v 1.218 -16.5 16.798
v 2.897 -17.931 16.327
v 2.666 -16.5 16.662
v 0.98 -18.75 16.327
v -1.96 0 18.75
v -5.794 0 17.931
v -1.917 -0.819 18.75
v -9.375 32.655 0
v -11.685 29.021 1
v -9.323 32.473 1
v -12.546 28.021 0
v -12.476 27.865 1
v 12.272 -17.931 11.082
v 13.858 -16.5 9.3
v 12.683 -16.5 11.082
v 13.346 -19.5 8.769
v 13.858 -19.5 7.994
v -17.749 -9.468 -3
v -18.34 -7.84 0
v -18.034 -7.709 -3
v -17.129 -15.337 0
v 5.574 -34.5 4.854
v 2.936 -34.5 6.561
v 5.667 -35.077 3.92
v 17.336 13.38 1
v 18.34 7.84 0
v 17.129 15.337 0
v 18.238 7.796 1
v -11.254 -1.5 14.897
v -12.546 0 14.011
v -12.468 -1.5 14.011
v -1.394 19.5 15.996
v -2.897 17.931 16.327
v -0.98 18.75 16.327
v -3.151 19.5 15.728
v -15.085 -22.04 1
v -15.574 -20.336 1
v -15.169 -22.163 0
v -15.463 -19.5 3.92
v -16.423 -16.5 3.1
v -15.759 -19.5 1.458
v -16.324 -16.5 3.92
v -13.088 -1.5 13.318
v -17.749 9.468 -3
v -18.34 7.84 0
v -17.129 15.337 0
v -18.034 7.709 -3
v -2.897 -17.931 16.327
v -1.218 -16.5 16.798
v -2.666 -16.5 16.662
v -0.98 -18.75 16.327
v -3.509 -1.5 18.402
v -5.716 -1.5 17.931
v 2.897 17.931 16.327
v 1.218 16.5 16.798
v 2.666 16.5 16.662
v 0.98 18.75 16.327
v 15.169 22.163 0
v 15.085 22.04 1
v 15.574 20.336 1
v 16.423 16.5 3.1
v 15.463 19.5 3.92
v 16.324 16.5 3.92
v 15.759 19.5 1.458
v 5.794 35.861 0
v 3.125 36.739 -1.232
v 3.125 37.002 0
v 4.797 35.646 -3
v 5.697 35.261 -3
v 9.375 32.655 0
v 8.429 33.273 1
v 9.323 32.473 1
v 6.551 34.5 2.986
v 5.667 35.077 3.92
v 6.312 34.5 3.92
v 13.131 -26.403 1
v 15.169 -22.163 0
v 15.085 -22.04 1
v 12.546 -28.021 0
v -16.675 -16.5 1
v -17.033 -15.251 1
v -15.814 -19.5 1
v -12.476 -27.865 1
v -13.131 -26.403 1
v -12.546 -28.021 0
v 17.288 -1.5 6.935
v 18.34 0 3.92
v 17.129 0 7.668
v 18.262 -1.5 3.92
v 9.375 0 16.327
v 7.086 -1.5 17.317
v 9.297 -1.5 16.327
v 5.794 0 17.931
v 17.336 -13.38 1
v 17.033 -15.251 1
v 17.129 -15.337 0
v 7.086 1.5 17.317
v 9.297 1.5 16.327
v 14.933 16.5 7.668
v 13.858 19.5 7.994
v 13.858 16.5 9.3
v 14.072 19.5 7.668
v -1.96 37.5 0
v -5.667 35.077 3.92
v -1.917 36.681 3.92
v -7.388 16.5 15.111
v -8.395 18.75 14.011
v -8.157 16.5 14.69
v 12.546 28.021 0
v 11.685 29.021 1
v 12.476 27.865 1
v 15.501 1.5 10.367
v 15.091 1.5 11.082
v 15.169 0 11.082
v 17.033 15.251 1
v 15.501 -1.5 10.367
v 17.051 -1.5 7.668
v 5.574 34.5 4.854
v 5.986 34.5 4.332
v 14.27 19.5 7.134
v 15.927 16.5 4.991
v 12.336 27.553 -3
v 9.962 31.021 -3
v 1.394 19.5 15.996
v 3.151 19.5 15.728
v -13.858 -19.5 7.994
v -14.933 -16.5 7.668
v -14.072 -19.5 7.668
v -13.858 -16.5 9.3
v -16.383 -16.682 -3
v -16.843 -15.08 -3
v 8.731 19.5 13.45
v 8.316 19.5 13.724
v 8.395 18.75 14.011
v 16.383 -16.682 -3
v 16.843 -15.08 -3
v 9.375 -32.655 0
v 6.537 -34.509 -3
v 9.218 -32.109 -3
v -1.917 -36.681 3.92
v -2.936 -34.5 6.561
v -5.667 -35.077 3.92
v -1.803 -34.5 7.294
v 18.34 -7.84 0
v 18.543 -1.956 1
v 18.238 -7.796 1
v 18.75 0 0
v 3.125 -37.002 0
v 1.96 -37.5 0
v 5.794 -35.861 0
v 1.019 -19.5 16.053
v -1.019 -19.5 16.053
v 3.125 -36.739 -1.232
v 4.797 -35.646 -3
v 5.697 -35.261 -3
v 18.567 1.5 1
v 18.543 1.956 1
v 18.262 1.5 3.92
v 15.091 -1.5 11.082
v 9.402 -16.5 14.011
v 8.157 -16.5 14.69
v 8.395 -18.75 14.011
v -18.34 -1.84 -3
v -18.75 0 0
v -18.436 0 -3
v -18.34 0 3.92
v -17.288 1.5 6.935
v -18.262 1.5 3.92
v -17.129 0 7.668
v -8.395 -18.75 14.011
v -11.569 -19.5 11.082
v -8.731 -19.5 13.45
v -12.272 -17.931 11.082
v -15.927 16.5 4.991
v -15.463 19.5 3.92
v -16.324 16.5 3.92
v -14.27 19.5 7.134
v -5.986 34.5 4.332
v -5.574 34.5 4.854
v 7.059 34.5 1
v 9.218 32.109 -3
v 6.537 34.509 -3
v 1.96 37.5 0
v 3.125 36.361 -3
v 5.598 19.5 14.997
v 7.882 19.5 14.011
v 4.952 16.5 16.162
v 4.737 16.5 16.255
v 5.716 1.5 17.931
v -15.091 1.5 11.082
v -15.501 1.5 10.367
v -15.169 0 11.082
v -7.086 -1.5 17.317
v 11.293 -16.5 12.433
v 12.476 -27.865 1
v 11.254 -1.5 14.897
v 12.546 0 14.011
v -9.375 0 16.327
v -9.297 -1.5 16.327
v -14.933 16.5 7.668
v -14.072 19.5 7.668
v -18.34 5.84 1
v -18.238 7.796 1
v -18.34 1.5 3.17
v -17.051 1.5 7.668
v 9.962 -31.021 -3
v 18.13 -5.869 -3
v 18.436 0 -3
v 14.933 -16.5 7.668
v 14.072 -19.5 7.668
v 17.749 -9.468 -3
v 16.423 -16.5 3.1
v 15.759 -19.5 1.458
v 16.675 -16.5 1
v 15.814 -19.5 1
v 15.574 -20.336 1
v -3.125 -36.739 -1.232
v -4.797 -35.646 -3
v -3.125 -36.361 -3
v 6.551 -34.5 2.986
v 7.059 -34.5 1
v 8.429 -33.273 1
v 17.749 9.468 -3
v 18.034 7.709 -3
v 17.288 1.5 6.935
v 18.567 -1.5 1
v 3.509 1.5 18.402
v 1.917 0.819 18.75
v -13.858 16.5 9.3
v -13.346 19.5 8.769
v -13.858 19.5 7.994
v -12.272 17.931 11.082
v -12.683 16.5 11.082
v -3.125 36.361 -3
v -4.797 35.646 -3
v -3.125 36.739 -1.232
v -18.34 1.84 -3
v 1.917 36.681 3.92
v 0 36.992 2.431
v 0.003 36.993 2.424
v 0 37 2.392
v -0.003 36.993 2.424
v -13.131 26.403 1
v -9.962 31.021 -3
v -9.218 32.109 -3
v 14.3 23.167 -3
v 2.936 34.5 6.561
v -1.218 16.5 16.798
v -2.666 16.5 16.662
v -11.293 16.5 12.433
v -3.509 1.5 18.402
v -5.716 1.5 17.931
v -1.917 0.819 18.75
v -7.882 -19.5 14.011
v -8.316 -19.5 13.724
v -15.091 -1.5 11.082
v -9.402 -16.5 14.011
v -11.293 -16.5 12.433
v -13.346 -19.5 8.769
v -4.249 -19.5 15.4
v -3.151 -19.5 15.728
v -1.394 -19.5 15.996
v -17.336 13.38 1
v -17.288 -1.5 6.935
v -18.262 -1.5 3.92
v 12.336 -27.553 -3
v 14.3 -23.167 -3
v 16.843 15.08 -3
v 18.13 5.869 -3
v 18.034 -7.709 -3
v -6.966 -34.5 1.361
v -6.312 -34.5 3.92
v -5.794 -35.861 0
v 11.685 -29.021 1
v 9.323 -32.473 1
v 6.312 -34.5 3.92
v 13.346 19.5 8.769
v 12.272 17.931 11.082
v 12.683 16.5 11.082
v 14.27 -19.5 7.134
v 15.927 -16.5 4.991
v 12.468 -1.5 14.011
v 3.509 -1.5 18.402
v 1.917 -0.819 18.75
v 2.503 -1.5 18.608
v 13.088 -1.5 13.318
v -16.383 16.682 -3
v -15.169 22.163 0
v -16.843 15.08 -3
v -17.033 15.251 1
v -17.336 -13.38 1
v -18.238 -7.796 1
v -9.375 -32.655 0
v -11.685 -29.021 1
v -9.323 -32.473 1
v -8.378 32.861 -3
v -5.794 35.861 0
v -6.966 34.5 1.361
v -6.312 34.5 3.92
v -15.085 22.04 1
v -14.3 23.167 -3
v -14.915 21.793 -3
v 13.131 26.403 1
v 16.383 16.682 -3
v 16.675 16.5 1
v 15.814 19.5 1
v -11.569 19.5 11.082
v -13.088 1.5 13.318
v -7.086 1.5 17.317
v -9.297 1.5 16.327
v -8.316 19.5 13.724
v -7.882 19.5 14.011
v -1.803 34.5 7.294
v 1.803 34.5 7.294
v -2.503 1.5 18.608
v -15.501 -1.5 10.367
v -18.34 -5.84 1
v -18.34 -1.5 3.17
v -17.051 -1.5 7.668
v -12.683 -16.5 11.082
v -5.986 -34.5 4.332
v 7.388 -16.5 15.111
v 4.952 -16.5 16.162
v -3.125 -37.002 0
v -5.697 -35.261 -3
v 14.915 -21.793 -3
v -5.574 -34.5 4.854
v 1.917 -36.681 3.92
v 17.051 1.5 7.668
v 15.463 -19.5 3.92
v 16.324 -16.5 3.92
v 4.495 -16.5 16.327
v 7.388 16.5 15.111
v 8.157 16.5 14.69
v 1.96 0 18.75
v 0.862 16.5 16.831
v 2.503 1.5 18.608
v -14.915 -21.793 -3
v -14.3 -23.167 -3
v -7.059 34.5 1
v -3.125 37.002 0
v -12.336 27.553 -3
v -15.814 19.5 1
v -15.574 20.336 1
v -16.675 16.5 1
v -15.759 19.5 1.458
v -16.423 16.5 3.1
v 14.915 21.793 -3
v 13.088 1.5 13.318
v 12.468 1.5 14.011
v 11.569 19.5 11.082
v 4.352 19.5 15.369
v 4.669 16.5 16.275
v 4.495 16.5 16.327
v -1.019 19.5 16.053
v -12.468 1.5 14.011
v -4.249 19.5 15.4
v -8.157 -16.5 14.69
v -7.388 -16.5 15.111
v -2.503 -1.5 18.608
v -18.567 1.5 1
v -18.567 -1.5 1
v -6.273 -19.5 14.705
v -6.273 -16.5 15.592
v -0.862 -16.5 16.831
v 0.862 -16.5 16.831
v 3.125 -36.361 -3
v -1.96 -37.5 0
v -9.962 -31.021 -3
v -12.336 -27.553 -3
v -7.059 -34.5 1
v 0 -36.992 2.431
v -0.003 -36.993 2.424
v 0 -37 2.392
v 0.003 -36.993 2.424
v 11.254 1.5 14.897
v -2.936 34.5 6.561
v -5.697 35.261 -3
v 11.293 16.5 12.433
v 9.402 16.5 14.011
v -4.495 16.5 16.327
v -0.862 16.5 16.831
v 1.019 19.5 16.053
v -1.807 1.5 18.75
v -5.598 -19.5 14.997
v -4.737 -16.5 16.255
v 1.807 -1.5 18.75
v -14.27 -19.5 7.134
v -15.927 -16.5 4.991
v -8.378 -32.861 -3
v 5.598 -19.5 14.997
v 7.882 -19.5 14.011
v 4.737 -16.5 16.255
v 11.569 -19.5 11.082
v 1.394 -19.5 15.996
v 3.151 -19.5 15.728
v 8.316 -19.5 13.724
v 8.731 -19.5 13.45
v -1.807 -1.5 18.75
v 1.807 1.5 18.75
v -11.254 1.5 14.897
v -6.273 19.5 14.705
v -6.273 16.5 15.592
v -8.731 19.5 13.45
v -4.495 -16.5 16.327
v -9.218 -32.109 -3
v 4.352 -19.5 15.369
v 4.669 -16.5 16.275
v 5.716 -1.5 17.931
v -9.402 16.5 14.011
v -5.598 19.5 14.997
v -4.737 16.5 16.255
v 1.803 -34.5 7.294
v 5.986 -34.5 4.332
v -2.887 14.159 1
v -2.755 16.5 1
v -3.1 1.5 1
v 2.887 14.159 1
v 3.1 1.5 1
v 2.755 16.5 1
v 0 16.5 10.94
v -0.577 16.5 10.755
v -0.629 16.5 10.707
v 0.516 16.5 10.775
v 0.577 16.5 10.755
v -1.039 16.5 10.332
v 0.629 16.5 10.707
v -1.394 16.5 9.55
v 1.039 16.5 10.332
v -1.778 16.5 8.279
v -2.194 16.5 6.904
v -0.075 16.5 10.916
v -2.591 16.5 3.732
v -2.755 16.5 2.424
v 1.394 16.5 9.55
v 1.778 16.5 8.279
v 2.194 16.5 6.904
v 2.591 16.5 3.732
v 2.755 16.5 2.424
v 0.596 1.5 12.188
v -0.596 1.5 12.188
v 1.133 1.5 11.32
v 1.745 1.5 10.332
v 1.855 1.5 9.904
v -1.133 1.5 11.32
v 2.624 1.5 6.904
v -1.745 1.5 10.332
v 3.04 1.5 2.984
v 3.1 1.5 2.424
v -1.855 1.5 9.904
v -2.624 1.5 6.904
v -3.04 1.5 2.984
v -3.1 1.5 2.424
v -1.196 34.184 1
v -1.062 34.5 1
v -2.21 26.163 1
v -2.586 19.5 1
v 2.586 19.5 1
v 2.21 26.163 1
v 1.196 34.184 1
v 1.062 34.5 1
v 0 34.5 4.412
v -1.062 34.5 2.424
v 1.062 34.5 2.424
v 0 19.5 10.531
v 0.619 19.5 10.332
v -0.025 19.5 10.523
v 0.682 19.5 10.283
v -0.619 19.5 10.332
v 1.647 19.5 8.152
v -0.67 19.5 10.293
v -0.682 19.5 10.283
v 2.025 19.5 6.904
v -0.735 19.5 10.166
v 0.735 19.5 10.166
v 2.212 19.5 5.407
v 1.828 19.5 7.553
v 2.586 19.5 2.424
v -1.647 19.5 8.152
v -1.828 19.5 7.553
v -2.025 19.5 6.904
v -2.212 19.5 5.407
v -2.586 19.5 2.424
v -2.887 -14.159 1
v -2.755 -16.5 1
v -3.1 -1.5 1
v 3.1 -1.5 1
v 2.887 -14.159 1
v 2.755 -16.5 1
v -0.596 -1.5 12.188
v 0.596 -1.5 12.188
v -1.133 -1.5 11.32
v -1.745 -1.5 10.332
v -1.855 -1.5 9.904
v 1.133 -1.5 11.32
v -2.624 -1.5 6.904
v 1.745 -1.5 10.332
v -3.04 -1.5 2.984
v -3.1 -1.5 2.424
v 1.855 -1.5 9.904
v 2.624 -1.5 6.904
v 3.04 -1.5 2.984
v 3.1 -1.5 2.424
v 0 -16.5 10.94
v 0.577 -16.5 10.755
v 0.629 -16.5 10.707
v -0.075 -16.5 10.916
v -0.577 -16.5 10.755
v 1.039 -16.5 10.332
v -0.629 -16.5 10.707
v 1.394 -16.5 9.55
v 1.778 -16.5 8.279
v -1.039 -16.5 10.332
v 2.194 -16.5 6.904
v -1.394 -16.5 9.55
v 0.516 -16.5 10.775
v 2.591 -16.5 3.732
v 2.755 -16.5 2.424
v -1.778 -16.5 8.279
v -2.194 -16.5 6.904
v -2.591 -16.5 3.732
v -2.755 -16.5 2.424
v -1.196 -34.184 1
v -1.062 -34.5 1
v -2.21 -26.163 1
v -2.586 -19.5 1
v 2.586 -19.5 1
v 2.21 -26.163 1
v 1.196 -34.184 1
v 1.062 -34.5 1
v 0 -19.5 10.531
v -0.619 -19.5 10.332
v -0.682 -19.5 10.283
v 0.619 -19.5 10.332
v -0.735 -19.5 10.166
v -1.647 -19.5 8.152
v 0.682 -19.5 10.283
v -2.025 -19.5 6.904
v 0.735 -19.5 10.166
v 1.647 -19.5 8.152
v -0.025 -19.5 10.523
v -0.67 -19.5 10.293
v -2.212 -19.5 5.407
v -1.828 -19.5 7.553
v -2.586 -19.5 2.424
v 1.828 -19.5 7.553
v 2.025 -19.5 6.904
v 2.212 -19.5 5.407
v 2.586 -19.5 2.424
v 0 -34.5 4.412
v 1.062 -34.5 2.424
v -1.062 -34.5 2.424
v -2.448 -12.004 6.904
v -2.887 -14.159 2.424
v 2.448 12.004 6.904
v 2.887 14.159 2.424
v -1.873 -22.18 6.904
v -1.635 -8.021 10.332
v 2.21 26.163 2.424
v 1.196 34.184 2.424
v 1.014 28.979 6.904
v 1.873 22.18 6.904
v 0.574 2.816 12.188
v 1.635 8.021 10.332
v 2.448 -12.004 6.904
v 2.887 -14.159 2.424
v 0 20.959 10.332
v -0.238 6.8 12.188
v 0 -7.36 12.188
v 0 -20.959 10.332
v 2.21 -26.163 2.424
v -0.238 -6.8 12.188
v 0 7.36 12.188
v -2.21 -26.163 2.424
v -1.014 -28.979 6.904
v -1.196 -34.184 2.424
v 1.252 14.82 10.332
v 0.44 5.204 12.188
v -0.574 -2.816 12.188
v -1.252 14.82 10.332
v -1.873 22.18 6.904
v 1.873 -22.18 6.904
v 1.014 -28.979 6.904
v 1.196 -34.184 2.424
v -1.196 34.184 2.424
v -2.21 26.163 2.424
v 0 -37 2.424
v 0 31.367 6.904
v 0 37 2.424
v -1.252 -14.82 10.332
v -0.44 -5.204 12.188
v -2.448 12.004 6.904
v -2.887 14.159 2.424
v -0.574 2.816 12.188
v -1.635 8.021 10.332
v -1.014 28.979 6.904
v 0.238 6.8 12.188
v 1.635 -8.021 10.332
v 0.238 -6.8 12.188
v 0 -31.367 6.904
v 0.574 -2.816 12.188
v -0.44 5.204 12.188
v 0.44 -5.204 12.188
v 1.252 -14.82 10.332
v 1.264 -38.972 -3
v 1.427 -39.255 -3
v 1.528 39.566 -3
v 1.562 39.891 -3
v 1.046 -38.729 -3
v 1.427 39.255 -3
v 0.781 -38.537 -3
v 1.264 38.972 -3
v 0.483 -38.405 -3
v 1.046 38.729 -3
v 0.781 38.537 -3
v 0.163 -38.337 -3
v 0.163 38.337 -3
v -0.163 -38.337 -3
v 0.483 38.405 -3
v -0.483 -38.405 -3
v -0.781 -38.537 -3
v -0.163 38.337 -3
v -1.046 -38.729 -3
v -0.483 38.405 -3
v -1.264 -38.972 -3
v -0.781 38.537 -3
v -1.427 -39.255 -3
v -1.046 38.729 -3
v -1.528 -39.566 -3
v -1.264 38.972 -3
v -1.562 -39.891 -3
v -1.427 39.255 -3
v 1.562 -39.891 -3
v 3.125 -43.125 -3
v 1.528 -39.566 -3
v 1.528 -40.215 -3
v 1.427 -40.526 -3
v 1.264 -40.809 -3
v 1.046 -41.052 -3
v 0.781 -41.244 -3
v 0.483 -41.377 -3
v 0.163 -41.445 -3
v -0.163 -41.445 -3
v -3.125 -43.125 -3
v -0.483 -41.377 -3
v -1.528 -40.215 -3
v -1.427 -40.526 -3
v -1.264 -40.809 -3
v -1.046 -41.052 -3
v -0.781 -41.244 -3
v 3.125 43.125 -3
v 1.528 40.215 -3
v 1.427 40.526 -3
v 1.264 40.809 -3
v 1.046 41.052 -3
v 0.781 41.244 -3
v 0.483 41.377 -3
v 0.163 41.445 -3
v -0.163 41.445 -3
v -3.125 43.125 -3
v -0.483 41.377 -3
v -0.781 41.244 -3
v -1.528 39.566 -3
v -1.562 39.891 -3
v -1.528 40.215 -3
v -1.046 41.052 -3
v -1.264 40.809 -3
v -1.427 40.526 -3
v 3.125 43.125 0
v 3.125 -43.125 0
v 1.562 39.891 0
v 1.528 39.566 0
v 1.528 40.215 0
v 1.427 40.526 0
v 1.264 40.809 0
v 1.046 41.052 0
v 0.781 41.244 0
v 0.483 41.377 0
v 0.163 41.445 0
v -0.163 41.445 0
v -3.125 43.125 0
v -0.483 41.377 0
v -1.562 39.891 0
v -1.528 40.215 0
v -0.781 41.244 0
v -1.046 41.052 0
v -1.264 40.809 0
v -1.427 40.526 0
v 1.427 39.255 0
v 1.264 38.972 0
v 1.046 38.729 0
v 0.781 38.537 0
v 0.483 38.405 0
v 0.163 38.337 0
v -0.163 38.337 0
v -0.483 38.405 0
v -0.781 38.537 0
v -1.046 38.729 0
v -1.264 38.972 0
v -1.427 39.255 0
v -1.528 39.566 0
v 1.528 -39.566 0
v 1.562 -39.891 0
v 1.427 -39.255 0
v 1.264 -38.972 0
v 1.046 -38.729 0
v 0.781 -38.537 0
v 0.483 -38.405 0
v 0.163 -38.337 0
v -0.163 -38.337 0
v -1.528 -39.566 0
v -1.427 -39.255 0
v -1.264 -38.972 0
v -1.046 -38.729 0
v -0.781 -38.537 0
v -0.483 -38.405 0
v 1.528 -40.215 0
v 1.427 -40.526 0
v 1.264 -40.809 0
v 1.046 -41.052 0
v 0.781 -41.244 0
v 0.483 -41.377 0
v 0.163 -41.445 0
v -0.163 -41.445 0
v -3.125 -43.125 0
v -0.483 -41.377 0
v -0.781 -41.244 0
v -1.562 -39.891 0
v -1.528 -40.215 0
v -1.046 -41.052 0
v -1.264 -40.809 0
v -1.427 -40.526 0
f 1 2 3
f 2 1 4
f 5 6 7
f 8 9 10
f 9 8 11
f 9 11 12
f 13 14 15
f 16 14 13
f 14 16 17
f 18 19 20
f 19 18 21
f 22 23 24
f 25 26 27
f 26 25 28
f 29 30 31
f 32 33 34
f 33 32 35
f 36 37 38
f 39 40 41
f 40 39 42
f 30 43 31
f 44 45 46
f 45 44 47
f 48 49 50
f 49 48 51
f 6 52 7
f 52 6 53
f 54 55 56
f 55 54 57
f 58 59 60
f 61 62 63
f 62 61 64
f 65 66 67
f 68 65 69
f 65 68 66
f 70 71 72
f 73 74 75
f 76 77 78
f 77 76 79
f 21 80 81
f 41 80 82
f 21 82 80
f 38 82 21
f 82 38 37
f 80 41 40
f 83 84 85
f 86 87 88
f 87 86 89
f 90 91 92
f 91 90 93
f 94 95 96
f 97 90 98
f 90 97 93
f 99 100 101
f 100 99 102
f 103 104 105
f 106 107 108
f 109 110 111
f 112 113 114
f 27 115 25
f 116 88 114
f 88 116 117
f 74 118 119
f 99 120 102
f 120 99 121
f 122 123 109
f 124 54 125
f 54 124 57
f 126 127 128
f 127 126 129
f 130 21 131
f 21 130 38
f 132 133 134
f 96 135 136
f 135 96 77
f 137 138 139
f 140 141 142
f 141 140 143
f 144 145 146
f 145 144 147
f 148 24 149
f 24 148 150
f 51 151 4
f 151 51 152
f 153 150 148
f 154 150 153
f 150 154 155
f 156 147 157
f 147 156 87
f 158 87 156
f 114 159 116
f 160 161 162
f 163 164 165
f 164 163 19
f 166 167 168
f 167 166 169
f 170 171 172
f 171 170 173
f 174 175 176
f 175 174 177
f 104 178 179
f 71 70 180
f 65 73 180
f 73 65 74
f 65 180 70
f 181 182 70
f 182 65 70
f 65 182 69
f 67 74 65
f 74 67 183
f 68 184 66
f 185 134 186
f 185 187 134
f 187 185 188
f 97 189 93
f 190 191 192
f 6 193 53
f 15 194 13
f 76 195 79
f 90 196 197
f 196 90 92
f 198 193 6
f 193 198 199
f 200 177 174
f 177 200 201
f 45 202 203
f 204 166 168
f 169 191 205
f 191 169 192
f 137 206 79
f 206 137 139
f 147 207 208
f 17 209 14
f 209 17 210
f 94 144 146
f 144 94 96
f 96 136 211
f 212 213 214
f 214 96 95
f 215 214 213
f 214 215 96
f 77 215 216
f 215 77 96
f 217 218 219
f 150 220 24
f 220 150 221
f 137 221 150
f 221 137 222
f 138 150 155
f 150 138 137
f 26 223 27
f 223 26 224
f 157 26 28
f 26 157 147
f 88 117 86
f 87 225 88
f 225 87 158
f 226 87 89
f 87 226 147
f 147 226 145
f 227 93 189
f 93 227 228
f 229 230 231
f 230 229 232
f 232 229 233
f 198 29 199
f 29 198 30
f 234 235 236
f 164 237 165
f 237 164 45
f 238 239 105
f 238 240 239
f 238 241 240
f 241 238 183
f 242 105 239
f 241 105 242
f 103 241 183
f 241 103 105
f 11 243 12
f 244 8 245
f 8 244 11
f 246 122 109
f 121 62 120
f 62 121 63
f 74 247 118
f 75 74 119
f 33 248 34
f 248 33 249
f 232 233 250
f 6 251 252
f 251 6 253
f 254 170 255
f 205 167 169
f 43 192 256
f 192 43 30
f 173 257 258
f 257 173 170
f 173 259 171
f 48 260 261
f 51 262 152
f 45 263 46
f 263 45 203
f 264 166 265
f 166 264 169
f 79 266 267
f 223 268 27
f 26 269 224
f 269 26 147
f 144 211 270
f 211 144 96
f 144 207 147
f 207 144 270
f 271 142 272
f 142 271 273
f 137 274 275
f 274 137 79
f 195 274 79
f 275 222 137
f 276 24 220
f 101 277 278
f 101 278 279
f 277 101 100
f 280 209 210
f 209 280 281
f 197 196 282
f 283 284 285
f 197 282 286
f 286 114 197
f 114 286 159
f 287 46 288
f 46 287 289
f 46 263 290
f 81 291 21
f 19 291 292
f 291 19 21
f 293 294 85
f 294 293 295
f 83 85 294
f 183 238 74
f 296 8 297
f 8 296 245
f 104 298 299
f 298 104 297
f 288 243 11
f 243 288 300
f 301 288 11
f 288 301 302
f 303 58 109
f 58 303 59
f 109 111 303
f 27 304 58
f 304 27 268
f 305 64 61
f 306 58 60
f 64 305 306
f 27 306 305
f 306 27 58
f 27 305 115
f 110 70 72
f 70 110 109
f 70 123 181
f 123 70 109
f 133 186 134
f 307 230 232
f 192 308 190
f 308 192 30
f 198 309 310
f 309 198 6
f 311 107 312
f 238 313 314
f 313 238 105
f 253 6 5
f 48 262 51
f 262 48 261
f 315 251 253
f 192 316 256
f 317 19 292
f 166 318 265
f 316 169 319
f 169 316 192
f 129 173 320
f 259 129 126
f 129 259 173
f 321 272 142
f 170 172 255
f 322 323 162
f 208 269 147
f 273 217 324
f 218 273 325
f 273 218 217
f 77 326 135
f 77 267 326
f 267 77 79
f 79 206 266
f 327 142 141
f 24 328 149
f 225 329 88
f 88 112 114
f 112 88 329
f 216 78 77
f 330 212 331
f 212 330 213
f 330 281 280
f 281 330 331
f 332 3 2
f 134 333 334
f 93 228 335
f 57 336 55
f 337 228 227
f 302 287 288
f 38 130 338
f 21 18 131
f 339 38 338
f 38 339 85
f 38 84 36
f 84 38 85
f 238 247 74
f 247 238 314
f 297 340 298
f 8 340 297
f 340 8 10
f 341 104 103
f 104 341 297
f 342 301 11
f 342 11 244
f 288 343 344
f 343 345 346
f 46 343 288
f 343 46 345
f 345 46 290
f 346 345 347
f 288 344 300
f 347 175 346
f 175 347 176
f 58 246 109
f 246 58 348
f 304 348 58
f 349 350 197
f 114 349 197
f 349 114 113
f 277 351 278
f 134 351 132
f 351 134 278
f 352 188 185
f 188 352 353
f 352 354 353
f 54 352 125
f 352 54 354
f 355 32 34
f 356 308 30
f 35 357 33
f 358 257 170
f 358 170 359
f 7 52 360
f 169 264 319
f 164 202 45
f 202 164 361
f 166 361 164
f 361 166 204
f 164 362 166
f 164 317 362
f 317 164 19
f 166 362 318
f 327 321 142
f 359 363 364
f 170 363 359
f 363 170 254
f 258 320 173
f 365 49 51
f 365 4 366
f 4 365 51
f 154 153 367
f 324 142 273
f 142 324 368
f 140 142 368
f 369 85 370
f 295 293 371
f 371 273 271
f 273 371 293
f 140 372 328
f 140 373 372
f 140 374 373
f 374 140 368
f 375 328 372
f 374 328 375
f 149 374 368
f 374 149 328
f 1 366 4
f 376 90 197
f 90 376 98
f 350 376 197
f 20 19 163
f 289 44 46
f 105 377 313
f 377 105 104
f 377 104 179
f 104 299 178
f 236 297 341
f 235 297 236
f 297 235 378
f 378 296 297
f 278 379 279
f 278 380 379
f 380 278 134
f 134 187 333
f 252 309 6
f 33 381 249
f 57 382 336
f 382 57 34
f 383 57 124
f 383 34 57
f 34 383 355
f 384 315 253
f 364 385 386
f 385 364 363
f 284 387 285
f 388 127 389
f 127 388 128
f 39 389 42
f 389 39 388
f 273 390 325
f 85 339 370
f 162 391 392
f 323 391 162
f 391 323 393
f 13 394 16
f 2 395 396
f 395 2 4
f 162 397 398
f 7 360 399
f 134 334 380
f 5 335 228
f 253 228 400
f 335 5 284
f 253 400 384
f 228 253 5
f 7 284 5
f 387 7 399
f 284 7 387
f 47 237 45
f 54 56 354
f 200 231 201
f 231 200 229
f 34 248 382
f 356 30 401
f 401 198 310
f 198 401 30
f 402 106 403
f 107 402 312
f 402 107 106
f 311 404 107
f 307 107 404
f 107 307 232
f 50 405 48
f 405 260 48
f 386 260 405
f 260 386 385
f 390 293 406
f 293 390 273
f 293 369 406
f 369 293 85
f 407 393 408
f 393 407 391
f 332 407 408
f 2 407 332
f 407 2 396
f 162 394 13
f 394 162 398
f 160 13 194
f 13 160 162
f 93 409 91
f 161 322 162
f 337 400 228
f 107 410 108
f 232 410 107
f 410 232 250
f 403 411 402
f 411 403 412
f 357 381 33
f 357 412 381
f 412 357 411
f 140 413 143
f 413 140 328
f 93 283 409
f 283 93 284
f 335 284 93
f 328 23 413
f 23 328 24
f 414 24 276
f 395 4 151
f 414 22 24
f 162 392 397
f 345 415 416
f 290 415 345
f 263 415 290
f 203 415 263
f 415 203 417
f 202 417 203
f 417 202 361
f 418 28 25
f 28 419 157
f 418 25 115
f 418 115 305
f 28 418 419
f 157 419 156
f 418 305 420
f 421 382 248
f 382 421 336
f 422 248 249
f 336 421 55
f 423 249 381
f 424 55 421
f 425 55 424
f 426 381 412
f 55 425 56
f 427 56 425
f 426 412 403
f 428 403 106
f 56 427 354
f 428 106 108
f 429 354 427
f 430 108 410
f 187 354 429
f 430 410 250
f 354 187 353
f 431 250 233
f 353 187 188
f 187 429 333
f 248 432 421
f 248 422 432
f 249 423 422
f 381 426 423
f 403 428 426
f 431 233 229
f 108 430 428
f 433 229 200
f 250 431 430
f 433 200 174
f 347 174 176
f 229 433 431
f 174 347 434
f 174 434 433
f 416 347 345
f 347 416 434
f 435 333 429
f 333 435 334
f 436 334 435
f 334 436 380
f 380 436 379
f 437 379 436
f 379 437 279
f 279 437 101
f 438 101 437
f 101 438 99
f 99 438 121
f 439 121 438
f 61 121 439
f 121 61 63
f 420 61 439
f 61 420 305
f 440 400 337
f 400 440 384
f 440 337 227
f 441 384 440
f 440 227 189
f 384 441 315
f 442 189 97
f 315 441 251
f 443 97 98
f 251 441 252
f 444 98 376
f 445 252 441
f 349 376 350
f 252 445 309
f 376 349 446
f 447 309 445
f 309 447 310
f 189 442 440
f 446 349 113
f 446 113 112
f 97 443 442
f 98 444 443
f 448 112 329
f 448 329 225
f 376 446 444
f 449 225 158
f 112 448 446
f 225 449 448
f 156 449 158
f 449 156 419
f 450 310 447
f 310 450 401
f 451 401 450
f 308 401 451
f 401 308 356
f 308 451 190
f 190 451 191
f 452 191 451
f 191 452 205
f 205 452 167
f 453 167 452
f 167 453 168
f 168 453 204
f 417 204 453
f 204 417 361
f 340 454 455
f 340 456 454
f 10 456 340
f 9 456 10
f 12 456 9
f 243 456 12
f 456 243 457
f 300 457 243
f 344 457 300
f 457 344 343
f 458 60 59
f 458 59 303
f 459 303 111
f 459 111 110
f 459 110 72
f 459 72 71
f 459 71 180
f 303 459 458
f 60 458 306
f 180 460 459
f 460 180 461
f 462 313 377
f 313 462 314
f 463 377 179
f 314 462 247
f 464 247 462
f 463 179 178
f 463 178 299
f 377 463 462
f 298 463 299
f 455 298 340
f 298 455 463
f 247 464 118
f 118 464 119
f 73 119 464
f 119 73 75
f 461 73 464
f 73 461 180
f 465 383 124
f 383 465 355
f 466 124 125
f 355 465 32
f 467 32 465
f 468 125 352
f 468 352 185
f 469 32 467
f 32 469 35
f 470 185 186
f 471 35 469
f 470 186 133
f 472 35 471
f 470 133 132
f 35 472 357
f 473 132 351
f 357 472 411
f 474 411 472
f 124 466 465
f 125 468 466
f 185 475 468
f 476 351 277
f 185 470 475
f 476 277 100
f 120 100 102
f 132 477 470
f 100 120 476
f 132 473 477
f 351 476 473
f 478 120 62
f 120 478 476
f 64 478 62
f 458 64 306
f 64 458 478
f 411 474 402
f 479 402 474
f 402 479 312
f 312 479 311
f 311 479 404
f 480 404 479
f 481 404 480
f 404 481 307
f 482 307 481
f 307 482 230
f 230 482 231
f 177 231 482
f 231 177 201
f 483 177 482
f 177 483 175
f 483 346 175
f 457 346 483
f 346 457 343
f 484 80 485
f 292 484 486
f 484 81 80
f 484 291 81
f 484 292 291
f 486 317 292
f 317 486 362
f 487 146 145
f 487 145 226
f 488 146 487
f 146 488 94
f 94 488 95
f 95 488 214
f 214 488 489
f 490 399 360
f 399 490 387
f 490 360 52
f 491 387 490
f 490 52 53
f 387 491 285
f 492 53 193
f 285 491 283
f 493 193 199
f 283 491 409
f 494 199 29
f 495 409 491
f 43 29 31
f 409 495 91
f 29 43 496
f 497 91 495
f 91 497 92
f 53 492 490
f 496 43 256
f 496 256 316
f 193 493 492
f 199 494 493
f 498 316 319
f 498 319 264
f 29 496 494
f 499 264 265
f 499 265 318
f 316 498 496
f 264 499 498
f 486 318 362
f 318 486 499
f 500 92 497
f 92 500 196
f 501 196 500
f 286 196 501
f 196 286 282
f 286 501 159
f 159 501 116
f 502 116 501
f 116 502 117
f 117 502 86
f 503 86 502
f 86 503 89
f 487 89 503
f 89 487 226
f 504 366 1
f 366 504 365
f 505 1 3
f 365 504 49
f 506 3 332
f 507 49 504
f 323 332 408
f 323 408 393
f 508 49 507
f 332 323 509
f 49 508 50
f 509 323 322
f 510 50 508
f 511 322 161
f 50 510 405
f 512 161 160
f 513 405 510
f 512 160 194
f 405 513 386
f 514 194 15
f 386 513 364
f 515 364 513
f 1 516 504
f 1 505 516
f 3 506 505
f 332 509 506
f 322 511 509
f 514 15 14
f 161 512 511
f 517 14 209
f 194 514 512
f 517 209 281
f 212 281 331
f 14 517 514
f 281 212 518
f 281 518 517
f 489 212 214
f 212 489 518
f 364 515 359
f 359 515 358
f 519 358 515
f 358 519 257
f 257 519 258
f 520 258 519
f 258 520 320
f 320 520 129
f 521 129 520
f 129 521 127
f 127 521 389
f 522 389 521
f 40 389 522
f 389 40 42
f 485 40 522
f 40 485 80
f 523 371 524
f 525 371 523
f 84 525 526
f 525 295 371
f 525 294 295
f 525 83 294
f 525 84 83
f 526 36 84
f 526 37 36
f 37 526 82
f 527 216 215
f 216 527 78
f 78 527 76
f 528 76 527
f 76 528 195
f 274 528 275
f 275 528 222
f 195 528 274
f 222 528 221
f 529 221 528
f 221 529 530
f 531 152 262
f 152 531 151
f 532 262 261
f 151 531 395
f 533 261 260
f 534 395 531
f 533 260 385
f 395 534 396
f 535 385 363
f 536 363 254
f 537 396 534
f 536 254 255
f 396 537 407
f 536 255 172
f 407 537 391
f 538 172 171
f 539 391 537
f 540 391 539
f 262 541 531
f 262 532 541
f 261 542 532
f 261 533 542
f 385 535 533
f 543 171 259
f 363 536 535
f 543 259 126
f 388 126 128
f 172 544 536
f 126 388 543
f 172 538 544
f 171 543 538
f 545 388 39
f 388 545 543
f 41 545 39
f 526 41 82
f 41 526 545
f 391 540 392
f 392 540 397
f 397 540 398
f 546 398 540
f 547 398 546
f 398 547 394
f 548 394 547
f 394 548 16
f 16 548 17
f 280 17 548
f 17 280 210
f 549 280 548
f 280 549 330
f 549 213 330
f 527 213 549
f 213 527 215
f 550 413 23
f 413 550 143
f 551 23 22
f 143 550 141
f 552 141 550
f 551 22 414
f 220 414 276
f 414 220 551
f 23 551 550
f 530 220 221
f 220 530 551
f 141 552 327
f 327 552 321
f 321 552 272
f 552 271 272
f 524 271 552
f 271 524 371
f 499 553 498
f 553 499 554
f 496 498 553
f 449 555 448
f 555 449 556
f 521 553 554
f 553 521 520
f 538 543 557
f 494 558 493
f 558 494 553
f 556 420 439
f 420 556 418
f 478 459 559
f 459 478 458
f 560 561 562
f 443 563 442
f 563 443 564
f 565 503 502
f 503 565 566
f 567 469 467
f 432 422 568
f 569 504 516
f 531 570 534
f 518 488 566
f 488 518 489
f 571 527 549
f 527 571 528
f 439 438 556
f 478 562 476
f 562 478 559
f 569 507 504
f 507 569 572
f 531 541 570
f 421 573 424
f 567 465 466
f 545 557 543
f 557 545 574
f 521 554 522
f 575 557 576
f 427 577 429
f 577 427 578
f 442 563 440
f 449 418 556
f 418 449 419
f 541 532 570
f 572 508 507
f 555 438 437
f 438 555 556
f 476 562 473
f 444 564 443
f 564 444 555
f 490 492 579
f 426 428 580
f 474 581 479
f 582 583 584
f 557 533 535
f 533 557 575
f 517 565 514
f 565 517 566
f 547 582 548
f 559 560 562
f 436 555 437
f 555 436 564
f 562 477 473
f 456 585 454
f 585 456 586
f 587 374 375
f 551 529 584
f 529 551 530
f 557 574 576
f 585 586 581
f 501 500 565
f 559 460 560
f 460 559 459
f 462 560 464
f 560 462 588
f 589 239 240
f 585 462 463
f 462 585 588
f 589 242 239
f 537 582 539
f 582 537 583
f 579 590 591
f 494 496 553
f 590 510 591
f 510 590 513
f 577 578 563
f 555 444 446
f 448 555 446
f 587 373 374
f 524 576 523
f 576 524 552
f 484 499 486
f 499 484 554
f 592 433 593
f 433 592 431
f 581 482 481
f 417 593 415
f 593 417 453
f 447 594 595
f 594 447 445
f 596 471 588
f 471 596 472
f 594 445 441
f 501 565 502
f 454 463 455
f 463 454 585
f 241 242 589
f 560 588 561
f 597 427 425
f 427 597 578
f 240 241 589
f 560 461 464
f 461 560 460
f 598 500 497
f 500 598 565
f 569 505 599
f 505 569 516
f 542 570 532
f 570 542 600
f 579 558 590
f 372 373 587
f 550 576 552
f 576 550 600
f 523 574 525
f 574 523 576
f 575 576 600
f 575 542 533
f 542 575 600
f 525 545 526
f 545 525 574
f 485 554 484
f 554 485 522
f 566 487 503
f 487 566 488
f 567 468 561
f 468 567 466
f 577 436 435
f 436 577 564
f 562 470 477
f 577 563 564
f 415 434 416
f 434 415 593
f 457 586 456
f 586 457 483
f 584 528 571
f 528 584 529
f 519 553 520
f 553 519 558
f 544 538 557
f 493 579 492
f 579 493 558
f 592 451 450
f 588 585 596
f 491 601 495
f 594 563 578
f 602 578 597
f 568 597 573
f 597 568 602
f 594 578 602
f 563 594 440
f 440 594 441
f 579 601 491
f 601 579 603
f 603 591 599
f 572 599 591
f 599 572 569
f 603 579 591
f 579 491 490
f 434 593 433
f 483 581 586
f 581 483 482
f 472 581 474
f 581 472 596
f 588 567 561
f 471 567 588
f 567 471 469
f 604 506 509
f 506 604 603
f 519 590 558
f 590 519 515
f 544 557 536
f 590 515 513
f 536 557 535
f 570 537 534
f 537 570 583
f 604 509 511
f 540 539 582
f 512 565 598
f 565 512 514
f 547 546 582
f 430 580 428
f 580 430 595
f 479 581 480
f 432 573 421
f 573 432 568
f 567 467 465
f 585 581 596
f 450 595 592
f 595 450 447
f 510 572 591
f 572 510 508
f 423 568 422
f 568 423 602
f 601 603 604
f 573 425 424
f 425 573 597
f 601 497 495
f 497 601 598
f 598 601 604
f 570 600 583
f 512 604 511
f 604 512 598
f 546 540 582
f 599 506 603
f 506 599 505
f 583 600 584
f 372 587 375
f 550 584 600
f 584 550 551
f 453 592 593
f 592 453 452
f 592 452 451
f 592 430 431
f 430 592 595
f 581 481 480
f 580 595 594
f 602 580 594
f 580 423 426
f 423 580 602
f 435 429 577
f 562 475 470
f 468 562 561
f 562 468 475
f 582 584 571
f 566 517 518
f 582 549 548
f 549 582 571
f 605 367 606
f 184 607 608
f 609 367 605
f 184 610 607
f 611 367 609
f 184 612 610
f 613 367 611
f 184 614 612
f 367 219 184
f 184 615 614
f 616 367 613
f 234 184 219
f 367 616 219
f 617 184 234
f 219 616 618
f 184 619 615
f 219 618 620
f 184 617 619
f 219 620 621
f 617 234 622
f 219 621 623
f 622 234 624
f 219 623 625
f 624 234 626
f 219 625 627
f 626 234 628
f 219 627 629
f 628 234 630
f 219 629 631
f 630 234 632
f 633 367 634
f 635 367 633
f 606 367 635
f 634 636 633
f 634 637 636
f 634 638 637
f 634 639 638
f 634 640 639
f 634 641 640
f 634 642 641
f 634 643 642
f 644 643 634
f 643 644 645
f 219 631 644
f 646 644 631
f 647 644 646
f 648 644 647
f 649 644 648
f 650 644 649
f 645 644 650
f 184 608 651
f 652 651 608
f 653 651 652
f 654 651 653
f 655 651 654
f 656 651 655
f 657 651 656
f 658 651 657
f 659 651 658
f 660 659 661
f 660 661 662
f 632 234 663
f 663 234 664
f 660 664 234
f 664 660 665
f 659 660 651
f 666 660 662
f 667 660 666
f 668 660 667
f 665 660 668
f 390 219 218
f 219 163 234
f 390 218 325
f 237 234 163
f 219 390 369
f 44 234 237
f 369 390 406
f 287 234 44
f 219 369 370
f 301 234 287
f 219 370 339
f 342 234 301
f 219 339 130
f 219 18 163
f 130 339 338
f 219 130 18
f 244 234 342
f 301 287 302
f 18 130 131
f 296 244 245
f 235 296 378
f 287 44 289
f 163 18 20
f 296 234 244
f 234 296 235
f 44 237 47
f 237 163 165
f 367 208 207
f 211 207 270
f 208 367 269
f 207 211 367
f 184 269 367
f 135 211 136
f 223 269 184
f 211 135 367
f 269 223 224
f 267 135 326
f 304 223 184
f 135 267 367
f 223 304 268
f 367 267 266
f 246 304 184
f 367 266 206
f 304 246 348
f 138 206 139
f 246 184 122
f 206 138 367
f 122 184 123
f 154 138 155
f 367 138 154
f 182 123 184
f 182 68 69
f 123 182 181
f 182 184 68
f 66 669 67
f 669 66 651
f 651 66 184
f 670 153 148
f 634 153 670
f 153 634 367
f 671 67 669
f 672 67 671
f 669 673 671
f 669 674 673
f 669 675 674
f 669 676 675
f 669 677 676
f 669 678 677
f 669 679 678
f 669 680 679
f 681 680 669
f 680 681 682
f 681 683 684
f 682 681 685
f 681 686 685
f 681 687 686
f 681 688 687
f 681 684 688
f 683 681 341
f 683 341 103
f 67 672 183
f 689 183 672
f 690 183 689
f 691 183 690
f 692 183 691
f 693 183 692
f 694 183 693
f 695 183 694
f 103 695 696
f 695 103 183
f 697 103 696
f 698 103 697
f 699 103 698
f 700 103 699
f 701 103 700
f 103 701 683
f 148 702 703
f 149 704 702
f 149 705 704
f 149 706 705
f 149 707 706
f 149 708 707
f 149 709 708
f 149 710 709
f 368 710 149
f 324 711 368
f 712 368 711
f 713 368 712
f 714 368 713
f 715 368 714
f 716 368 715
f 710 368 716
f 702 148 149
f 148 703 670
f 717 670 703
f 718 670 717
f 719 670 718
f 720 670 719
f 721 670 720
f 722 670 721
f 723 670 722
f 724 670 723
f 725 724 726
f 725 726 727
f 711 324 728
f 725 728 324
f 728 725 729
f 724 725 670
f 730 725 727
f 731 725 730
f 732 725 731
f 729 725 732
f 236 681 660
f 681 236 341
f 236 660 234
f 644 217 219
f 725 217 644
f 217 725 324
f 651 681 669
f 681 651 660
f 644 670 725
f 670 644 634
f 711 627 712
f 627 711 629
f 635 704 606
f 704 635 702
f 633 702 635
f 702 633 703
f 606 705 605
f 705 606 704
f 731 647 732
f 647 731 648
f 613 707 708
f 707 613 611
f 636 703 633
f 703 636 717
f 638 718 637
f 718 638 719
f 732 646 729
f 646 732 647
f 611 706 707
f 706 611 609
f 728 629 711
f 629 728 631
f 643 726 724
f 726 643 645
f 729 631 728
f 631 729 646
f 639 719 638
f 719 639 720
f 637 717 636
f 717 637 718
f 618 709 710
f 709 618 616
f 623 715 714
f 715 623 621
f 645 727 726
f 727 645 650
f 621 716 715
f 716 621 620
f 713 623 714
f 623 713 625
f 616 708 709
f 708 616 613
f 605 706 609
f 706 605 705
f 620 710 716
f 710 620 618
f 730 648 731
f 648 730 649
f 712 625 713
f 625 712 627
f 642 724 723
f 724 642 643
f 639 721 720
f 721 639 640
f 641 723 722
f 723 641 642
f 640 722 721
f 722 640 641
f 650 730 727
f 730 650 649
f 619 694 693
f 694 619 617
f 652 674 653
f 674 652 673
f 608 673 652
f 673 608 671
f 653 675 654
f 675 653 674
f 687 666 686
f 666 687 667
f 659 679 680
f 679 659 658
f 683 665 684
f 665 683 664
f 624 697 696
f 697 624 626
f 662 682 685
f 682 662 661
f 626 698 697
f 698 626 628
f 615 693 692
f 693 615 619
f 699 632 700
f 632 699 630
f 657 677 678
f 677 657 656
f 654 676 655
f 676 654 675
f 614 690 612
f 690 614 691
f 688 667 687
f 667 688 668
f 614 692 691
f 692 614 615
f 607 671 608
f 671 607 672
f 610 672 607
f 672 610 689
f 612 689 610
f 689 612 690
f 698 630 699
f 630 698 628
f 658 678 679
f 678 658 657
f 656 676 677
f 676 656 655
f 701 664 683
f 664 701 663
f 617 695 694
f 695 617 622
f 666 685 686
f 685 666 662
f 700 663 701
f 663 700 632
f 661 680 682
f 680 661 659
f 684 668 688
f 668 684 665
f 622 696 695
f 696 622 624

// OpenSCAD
// EDIT THESE FREELY :-)
/* [Main Dimensions] */
// Overall feeder length (mm)
l = 75; // [10:1000]
// Feeder width. We recommend half of length. (mm)
w = l / 2;

// STOP EDITING BELOW HERE
// Or you will probably be tweaking a while...
/* [Hidden] */

// Gap and bridges together make up the chum holder side
// Gap is the space between the bridges. We assume 4 gaps
gap_l = l / 5;
gap_w = w;
bridge_l = l / 5 / 5;

module oval_shape() {
  // Large radius ensures we have plenty of edges in the transform 
  resize(newsize=[w,l,w]) 
  sphere(r=50);
}

module gap() { cube([gap_w, gap_l, gap_w]); }

module chum_side() {
  // Cut off the lower half
  difference() {
    // Union the oval shape, gaps, and center spine
    translate([-w/2, 0, 0]) 
    union() {
      difference() {
        translate([w/2, 0, 0]) oval_shape();
        translate([0, bridge_l / 2, 1]) gap();
        translate([0, gap_l + 1.5*bridge_l, 1]) gap();
        translate([0, -gap_l - bridge_l/2, 1]) gap();
        translate([0, -2*gap_l - 1.5*bridge_l, 1]) gap();
      }
      
      translate([w/2, 0, 0]) 
        resize(newsize=[w/6, l-1 ,0.65* w]) 
          sphere(r=5);
    }
    
    translate([0,0,-w/2 - 3]) 
      cube([w, l, w], center=true);
  }
}

module line_holders() {
  difference() {
    tip_l = l*1.15;
    hole_r = min(2.5, w/6/4);
    translate([0,0,-1.5]) cube([w/6, tip_l, 3], center=true);
    translate([0, -tip_l/2*.925, -5]) cylinder(r=hole_r,h=30, $fn=30);
    translate([0, tip_l/2*.925, -5]) cylinder(r=hole_r,h=30, $fn=30);
  }
}

module do_it() {
  union() {
    chum_side();
    line_holders();
  }
}

do_it();
